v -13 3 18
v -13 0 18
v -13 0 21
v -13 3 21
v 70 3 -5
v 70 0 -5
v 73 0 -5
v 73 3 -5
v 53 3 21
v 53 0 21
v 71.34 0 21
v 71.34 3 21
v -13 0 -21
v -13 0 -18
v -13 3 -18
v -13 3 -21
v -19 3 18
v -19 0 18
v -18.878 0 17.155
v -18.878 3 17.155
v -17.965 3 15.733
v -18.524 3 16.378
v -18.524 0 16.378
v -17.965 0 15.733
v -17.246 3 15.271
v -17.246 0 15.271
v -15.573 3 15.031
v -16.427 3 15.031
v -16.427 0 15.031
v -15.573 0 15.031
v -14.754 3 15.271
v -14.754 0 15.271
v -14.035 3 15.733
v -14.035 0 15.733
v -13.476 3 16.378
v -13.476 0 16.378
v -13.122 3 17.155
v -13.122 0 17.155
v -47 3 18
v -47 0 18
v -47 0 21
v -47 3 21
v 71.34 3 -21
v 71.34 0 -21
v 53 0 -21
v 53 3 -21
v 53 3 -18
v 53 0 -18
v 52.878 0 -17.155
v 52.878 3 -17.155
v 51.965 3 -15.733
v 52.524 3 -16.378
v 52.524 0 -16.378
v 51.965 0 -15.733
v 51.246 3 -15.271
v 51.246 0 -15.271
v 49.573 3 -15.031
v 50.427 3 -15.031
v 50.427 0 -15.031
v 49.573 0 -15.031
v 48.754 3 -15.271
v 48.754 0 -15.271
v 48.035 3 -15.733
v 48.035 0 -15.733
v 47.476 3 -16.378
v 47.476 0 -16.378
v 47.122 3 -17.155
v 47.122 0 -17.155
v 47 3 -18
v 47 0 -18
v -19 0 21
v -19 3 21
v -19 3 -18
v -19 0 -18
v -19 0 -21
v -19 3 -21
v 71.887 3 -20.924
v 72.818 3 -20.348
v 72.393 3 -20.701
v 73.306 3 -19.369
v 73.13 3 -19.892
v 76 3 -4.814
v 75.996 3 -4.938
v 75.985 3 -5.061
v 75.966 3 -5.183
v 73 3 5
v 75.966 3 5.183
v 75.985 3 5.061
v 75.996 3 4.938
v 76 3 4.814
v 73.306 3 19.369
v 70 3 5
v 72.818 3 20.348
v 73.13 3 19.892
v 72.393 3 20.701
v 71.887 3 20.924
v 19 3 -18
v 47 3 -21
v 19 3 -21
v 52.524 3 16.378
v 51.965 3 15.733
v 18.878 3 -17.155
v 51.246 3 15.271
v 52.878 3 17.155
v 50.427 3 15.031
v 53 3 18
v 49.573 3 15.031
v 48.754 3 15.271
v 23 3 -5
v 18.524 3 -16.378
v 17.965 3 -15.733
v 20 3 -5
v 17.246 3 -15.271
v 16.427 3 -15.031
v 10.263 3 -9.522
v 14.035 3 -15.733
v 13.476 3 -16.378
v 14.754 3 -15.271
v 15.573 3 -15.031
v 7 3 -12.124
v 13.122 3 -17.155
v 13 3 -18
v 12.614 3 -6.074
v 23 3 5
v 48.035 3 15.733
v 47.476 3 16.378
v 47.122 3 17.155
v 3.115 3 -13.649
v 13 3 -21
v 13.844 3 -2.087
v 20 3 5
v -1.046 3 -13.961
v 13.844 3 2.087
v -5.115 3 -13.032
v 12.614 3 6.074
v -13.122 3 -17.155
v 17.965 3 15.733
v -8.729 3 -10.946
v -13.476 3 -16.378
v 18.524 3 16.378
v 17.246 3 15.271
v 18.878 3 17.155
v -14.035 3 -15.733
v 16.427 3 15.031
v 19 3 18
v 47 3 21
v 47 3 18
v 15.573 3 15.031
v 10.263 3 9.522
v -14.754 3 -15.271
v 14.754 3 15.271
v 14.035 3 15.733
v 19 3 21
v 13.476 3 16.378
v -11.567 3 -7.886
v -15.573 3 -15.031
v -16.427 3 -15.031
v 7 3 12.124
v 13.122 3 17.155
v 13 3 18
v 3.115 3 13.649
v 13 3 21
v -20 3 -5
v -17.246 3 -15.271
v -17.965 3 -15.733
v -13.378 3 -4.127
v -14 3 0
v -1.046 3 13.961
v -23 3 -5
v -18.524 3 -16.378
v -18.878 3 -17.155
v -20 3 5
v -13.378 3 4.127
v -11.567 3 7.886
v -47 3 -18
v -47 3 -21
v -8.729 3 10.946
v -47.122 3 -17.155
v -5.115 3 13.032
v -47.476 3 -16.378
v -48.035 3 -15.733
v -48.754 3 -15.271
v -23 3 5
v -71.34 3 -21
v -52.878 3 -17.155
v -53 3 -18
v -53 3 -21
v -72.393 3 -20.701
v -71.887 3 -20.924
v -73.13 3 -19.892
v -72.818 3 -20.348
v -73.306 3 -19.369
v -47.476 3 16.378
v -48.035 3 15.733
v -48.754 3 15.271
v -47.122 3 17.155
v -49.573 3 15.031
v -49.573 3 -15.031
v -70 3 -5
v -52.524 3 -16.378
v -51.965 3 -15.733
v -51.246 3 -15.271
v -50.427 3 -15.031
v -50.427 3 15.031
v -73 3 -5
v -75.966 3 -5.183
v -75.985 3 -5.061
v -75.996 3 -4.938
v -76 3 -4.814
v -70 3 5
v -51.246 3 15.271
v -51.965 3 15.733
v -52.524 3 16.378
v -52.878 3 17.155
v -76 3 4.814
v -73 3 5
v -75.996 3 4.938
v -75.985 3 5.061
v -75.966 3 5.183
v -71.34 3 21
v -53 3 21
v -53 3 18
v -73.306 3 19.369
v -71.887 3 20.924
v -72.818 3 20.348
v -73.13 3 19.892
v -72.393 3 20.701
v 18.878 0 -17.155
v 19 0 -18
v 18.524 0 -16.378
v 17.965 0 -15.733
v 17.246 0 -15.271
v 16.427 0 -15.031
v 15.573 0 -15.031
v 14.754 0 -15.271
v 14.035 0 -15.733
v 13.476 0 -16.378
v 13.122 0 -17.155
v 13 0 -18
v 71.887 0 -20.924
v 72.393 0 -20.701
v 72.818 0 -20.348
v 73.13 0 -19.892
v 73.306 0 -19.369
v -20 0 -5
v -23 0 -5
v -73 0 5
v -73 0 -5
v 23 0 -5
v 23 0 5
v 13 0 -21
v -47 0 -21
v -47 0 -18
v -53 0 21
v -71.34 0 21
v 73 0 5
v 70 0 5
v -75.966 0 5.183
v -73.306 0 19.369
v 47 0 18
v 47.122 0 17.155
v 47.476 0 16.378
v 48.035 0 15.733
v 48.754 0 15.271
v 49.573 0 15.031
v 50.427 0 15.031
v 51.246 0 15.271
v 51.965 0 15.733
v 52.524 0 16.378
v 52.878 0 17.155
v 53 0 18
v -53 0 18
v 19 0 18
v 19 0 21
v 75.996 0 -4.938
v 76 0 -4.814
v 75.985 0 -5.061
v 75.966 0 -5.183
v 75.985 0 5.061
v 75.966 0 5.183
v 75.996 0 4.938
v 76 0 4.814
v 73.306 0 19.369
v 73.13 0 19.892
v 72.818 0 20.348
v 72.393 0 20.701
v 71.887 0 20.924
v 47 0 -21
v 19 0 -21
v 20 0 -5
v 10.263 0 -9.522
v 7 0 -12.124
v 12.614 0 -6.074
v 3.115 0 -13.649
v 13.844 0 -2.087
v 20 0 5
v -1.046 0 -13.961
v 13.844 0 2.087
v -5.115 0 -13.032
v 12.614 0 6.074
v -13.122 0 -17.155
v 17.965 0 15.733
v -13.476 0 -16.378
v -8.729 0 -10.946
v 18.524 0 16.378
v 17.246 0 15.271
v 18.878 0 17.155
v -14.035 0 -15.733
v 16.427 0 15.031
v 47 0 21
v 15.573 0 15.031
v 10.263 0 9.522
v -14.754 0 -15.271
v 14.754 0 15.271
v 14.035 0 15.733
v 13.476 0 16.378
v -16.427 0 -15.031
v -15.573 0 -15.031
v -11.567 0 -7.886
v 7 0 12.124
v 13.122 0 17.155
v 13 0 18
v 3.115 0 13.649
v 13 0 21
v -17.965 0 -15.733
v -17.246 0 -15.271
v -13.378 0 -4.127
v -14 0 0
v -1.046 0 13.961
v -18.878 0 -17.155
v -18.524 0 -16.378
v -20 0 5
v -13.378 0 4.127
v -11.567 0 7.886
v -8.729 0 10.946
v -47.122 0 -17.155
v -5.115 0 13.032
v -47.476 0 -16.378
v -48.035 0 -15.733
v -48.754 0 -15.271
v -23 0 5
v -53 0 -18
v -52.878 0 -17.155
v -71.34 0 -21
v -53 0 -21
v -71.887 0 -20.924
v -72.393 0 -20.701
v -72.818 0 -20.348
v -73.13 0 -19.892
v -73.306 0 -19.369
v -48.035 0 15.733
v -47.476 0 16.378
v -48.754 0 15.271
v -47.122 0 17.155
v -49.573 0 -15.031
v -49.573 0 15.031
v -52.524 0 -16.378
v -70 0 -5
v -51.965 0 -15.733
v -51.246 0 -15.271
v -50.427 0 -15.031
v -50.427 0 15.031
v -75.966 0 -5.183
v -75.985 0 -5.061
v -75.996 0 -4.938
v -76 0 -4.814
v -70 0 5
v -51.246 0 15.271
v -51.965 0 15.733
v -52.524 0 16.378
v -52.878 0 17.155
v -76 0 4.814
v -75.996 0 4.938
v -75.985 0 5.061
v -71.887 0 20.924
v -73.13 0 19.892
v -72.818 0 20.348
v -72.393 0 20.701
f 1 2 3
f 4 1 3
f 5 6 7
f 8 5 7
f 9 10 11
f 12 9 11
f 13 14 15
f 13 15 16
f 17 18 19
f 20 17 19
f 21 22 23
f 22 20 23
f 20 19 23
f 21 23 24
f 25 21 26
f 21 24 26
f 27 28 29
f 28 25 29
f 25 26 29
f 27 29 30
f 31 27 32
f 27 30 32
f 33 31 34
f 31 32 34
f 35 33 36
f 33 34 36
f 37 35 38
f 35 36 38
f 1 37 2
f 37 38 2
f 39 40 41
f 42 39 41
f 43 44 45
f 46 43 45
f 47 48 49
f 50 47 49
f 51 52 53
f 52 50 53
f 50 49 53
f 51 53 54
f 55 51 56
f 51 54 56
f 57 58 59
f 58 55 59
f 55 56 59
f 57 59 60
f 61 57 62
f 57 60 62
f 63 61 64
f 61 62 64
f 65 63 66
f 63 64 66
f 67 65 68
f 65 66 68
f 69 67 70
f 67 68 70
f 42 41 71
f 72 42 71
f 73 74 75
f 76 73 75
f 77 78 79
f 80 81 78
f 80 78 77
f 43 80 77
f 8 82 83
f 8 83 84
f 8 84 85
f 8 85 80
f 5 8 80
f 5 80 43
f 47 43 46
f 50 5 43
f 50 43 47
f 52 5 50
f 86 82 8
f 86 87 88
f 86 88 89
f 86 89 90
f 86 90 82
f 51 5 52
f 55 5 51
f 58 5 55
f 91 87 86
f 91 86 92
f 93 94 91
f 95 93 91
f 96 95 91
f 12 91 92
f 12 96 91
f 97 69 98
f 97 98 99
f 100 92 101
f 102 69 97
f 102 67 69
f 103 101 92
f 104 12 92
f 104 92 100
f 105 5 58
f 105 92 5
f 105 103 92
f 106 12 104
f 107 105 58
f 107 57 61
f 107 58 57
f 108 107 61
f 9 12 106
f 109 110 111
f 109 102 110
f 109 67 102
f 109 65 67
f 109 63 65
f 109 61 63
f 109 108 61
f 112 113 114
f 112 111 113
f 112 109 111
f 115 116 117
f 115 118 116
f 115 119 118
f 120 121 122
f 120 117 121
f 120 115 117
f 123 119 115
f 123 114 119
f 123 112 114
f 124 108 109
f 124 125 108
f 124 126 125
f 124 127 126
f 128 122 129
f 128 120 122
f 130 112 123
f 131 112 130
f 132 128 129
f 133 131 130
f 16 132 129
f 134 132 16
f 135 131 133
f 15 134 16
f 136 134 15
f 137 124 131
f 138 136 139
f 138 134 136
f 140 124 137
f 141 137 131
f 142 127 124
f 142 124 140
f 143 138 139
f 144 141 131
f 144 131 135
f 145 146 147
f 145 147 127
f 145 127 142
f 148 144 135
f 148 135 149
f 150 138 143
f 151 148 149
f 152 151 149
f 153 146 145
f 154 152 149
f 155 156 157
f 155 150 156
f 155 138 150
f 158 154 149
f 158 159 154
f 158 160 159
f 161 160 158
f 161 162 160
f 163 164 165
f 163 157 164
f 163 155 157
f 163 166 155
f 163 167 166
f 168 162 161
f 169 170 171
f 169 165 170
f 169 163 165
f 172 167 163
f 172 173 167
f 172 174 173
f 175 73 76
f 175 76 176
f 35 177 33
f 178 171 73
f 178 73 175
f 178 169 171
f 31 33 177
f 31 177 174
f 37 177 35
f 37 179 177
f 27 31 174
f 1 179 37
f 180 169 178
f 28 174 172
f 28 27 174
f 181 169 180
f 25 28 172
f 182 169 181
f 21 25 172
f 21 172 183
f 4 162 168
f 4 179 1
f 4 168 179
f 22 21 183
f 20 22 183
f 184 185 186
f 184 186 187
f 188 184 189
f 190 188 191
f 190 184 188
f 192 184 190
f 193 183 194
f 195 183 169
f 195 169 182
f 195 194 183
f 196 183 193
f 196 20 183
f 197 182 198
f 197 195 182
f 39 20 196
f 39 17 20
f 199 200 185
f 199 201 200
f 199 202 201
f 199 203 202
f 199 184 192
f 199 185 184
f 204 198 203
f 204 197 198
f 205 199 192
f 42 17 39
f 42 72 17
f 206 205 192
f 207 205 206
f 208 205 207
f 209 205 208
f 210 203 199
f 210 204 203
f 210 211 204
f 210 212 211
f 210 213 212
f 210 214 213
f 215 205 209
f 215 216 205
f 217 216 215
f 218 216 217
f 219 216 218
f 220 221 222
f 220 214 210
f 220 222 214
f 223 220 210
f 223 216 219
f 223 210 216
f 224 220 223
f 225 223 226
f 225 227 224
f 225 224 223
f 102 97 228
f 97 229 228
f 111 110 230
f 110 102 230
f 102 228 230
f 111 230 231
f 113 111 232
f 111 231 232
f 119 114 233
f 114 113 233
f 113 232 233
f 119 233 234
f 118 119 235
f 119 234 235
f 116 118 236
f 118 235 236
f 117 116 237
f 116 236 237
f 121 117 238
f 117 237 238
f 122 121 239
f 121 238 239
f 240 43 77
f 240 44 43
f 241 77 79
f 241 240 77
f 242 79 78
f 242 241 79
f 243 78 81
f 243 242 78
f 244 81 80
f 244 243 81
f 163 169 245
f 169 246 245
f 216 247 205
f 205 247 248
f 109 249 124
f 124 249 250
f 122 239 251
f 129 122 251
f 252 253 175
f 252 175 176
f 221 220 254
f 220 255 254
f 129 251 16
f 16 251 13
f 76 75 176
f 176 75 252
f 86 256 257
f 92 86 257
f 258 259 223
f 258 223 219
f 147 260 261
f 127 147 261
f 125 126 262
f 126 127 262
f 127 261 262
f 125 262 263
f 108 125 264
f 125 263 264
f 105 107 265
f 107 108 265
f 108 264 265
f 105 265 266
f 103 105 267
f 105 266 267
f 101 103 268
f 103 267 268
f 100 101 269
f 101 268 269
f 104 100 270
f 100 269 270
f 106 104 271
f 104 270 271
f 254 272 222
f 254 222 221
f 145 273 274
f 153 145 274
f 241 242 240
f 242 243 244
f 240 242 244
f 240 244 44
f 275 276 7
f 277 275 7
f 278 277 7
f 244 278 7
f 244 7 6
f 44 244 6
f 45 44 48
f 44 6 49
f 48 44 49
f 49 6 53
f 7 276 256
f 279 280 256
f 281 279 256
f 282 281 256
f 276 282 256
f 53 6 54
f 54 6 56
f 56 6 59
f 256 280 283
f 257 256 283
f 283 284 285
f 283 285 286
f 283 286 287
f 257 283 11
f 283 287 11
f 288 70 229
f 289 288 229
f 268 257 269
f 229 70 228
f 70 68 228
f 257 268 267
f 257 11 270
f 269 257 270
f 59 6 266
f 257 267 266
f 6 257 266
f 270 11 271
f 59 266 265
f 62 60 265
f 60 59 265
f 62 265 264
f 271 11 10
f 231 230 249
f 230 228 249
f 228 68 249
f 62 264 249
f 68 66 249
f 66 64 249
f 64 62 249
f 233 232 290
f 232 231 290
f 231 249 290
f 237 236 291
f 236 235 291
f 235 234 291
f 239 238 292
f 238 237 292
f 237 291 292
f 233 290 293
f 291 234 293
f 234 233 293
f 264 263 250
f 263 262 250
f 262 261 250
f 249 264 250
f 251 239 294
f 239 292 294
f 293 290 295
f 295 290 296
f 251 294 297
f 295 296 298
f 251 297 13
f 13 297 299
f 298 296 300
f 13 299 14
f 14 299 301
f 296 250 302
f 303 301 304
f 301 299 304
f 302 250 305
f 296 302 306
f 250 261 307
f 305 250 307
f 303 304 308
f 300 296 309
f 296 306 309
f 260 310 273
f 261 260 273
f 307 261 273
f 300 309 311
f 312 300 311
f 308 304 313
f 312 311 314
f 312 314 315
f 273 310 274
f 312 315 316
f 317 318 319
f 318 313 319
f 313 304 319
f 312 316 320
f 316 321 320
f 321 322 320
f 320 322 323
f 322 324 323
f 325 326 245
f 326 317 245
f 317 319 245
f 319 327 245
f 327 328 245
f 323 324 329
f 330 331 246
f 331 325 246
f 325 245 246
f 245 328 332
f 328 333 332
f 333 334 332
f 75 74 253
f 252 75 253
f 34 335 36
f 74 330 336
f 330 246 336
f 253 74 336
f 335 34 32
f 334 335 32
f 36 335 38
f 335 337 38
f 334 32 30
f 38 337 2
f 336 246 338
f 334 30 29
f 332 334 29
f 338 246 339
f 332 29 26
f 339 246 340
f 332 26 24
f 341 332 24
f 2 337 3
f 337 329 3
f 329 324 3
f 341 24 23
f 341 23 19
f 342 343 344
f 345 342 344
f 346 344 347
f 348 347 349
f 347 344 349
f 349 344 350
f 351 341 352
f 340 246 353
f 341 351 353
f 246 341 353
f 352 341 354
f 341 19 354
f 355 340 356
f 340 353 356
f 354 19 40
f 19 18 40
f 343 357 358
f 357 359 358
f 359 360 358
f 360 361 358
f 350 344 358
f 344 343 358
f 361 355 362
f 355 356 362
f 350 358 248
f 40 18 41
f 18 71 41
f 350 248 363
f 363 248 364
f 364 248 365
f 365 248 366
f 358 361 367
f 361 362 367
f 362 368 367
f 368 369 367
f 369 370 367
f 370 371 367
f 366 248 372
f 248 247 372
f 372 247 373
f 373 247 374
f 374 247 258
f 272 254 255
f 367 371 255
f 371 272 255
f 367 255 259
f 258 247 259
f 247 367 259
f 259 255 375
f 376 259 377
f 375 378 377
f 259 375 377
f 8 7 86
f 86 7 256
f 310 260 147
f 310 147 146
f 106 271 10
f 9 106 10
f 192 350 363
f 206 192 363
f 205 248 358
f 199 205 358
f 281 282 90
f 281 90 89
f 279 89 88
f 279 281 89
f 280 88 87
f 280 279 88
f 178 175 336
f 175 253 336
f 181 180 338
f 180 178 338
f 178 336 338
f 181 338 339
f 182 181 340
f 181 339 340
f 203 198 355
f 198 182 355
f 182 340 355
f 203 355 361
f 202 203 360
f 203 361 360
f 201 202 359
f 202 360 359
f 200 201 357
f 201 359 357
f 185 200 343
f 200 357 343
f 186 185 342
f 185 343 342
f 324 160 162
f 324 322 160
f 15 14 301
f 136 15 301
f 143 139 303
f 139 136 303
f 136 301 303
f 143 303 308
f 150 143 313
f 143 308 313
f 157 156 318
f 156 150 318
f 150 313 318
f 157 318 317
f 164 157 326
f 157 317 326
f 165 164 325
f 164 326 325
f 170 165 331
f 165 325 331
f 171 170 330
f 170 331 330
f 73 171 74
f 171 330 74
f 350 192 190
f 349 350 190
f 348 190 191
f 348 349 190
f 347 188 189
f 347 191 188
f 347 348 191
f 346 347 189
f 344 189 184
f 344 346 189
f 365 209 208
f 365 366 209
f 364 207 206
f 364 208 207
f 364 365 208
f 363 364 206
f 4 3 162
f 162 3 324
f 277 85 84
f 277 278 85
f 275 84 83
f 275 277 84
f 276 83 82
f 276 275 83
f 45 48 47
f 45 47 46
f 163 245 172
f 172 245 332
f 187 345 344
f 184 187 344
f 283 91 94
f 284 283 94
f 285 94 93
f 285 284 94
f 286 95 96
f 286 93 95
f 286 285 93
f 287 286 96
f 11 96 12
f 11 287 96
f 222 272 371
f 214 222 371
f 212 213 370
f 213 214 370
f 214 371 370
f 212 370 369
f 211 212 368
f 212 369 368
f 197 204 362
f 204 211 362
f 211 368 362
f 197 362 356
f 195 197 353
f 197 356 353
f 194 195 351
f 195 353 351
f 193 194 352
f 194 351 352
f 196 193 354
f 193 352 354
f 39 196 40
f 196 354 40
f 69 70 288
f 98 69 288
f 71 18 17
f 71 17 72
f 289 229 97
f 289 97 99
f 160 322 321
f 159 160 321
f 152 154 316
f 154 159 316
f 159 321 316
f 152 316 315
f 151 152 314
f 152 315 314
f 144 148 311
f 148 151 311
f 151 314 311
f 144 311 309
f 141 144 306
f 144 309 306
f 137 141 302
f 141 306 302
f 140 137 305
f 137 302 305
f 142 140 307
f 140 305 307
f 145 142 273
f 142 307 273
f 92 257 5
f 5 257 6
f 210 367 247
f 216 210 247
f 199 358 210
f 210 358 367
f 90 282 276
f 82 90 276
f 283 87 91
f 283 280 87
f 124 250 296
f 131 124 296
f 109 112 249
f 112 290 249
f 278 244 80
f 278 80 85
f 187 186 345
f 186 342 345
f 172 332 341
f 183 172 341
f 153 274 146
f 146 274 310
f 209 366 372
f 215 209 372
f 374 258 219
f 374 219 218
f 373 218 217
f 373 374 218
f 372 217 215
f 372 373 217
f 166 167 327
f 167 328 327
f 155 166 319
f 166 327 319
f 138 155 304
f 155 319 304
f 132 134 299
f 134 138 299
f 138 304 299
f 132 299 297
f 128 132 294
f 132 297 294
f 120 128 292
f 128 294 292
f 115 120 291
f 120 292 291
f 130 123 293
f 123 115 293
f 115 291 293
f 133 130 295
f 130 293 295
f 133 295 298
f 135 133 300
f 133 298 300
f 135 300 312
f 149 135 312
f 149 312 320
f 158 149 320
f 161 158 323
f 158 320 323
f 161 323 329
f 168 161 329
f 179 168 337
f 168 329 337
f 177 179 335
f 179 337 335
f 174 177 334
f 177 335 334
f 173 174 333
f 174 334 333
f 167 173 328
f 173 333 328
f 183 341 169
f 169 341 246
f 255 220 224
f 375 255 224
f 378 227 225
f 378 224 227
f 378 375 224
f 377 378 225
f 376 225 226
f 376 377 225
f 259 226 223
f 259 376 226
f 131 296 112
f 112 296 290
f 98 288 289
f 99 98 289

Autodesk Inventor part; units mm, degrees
ref_plane "YZ Plane" through (0, 0, 0) normal (1, 0, 0) x (0, 1, 0)
ref_plane "XZ Plane" through (0, 0, 0) normal (0, 1, 0) x (-1, 0, 0)
ref_plane "XY Plane" through (0, 0, 0) normal (0, 0, 1) x (1, 0, 0)
sketch "Sketch1" plane through (0, 0, 0) normal (0, 1, 0) x (-1, 0, 0)
  line L0 (76, -4.8141) -> (76, 4.8141)
  line L1 (-76, 4.8141) -> (-76, -4.8141)
  circle A0 centre (0, 0) radius 14
  line L2 (-23, 5) -> (-20, 5)
  line L3 (-20, 5) -> (-20, -5)
  line L4 (-20, -5) -> (-23, -5)
  line L5 (-23, -5) -> (-23, 5)
  line L6 (20, 5) -> (23, 5)
  line L7 (23, 5) -> (23, -5)
  line L8 (23, -5) -> (20, -5)
  line L9 (20, -5) -> (20, 5)
  line L10 (-73, 5) -> (-70, 5)
  line L11 (-70, 5) -> (-70, -5)
  line L12 (-70, -5) -> (-73, -5)
  line L13 (-73, -5) -> (-73, 5)
  line L14 (70, 5) -> (73, 5)
  line L15 (73, 5) -> (73, -5)
  line L16 (73, -5) -> (70, -5)
  line L17 (70, -5) -> (70, 5)
  arc A1 (-13, -18) -> (-19, -18) centre (-16, -18) ccw
  arc A2 (-19, 18) -> (-13, 18) centre (-16, 18) ccw
  arc A3 (19, -18) -> (13, -18) centre (16, -18) ccw
  arc A4 (13, 18) -> (19, 18) centre (16, 18) ccw
  line L18 (-19, 18) -> (-19, 21)
  line L19 (-13, 18) -> (-13, 21)
  line L20 (13, 18) -> (13, 21)
  line L21 (19, 18) -> (19, 21)
  line L22 (13, -18) -> (13, -21)
  line L23 (19, -18) -> (19, -21)
  line L24 (-13, -18) -> (-13, -21)
  line L25 (-19, -18) -> (-19, -21)
  line L26 (-13, -21) -> (13, -21)
  line L27 (13, 21) -> (-13, 21)
  arc A5 (-53, 18) -> (-47, 18) centre (-50, 18) ccw
  arc A6 (-47, -18) -> (-53, -18) centre (-50, -18) ccw
  arc A7 (47, 18) -> (53, 18) centre (50, 18) ccw
  arc A8 (53, -18) -> (47, -18) centre (50, -18) ccw
  line L28 (-53, 18) -> (-53, 21)
  line L29 (-47, 18) -> (-47, 21)
  line L30 (-53, -18) -> (-53, -21)
  line L31 (-47, -18) -> (-47, -21)
  line L32 (53, -18) -> (53, -21)
  line L33 (47, -18) -> (47, -21)
  line L34 (53, 18) -> (53, 21)
  line L35 (47, 18) -> (47, 21)
  line L36 (71.3401, 21) -> (53, 21)
  line L37 (47, 21) -> (19, 21)
  line L38 (19, -21) -> (47, -21)
  line L39 (53, -21) -> (71.3401, -21)
  line L40 (-71.3401, -21) -> (-53, -21)
  line L41 (-47, -21) -> (-19, -21)
  line L42 (-19, 21) -> (-47, 21)
  line L43 (-53, 21) -> (-71.3401, 21)
  line L44 (-75.9657, 5.1827) -> (-73.3059, 19.3686)
  line L45 (-73.3059, -19.3686) -> (-75.9657, -5.1827)
  line L46 (73.3059, 19.3686) -> (75.9657, 5.1827)
  line L47 (73.3059, -19.3686) -> (75.9657, -5.1827)
  arc A9 (-71.3401, 21) -> (-73.3059, 19.3686) centre (-71.3401, 19) ccw
  arc A10 (-75.9657, 5.1827) -> (-76, 4.8141) centre (-74, 4.8141) ccw
  arc A11 (-76, -4.8141) -> (-75.9657, -5.1827) centre (-74, -4.8141) ccw
  arc A12 (-73.3059, -19.3686) -> (-71.3401, -21) centre (-71.3401, -19) ccw
  arc A13 (71.3401, -21) -> (73.3059, -19.3686) centre (71.3401, -19) ccw
  arc A14 (75.9657, -5.1827) -> (76, -4.8141) centre (74, -4.8141) ccw
  arc A15 (73.3059, 19.3686) -> (71.3401, 21) centre (71.3401, 19) ccw
  arc A16 (76, 4.8141) -> (75.9657, 5.1827) centre (74, 4.8141) ccw
  point P0 (-73, -21)
  point P1 (73, 21)
  point P2 (73, -21)
  point P3 (-73, 21)
  point P4 (-20, 0)
  point P5 (20, 0)
  point P6 (-76, 5)
  point P7 (-76, -5)
  point P8 (76, 5)
  point P9 (76, -5)
  dimension "d2" = 42
  dimension "d3" = 28
  dimension "d4" = 76
  dimension "d6" = 3
  dimension "d7" = 10
  dimension "d8" = 20
  dimension "d9" = 3
  dimension "d10" = 10
  dimension "d11" = 20
  dimension "d12" = 3
  dimension "d13" = 10
  dimension "d14" = 3
  dimension "d15" = 3
  dimension "d16" = 10
  dimension "d17" = 3
  dimension "d18" = 5
  dimension "d19" = 5
  dimension "d20" = 6
  dimension "d21" = 16
  dimension "d24" = 6
  dimension "d25" = 16
  dimension "d26" = 6
  dimension "d27" = 16
  dimension "d28" = 6
  dimension "d29" = 16
  dimension "d32" = 6
  dimension "d33" = 50
  dimension "d35" = 50
  dimension "d38" = 76
  dimension "d39" = 21
  dimension "d40" = 3
  dimension "d41" = 3
  dimension "d42" = 10
  dimension "d43" = 10
  dimension "d44" = 21
  dimension "d45" = 2
  dimension "d46" = 50
  dimension "d47" = 50
  dimension "d48" = 3
  dimension "d49" = 3
  dimension "d50" = 3
  dimension "d51" = 3
  dimension "d52" = 3
  dimension "d53" = 3
  dimension "d54" = 3
  dimension "d55" = 3
  dimension "d56" = 100.62
extrude "Extrusion1" add sketch "Sketch1" along normal blind 3
properties part number "Camera Platform"
